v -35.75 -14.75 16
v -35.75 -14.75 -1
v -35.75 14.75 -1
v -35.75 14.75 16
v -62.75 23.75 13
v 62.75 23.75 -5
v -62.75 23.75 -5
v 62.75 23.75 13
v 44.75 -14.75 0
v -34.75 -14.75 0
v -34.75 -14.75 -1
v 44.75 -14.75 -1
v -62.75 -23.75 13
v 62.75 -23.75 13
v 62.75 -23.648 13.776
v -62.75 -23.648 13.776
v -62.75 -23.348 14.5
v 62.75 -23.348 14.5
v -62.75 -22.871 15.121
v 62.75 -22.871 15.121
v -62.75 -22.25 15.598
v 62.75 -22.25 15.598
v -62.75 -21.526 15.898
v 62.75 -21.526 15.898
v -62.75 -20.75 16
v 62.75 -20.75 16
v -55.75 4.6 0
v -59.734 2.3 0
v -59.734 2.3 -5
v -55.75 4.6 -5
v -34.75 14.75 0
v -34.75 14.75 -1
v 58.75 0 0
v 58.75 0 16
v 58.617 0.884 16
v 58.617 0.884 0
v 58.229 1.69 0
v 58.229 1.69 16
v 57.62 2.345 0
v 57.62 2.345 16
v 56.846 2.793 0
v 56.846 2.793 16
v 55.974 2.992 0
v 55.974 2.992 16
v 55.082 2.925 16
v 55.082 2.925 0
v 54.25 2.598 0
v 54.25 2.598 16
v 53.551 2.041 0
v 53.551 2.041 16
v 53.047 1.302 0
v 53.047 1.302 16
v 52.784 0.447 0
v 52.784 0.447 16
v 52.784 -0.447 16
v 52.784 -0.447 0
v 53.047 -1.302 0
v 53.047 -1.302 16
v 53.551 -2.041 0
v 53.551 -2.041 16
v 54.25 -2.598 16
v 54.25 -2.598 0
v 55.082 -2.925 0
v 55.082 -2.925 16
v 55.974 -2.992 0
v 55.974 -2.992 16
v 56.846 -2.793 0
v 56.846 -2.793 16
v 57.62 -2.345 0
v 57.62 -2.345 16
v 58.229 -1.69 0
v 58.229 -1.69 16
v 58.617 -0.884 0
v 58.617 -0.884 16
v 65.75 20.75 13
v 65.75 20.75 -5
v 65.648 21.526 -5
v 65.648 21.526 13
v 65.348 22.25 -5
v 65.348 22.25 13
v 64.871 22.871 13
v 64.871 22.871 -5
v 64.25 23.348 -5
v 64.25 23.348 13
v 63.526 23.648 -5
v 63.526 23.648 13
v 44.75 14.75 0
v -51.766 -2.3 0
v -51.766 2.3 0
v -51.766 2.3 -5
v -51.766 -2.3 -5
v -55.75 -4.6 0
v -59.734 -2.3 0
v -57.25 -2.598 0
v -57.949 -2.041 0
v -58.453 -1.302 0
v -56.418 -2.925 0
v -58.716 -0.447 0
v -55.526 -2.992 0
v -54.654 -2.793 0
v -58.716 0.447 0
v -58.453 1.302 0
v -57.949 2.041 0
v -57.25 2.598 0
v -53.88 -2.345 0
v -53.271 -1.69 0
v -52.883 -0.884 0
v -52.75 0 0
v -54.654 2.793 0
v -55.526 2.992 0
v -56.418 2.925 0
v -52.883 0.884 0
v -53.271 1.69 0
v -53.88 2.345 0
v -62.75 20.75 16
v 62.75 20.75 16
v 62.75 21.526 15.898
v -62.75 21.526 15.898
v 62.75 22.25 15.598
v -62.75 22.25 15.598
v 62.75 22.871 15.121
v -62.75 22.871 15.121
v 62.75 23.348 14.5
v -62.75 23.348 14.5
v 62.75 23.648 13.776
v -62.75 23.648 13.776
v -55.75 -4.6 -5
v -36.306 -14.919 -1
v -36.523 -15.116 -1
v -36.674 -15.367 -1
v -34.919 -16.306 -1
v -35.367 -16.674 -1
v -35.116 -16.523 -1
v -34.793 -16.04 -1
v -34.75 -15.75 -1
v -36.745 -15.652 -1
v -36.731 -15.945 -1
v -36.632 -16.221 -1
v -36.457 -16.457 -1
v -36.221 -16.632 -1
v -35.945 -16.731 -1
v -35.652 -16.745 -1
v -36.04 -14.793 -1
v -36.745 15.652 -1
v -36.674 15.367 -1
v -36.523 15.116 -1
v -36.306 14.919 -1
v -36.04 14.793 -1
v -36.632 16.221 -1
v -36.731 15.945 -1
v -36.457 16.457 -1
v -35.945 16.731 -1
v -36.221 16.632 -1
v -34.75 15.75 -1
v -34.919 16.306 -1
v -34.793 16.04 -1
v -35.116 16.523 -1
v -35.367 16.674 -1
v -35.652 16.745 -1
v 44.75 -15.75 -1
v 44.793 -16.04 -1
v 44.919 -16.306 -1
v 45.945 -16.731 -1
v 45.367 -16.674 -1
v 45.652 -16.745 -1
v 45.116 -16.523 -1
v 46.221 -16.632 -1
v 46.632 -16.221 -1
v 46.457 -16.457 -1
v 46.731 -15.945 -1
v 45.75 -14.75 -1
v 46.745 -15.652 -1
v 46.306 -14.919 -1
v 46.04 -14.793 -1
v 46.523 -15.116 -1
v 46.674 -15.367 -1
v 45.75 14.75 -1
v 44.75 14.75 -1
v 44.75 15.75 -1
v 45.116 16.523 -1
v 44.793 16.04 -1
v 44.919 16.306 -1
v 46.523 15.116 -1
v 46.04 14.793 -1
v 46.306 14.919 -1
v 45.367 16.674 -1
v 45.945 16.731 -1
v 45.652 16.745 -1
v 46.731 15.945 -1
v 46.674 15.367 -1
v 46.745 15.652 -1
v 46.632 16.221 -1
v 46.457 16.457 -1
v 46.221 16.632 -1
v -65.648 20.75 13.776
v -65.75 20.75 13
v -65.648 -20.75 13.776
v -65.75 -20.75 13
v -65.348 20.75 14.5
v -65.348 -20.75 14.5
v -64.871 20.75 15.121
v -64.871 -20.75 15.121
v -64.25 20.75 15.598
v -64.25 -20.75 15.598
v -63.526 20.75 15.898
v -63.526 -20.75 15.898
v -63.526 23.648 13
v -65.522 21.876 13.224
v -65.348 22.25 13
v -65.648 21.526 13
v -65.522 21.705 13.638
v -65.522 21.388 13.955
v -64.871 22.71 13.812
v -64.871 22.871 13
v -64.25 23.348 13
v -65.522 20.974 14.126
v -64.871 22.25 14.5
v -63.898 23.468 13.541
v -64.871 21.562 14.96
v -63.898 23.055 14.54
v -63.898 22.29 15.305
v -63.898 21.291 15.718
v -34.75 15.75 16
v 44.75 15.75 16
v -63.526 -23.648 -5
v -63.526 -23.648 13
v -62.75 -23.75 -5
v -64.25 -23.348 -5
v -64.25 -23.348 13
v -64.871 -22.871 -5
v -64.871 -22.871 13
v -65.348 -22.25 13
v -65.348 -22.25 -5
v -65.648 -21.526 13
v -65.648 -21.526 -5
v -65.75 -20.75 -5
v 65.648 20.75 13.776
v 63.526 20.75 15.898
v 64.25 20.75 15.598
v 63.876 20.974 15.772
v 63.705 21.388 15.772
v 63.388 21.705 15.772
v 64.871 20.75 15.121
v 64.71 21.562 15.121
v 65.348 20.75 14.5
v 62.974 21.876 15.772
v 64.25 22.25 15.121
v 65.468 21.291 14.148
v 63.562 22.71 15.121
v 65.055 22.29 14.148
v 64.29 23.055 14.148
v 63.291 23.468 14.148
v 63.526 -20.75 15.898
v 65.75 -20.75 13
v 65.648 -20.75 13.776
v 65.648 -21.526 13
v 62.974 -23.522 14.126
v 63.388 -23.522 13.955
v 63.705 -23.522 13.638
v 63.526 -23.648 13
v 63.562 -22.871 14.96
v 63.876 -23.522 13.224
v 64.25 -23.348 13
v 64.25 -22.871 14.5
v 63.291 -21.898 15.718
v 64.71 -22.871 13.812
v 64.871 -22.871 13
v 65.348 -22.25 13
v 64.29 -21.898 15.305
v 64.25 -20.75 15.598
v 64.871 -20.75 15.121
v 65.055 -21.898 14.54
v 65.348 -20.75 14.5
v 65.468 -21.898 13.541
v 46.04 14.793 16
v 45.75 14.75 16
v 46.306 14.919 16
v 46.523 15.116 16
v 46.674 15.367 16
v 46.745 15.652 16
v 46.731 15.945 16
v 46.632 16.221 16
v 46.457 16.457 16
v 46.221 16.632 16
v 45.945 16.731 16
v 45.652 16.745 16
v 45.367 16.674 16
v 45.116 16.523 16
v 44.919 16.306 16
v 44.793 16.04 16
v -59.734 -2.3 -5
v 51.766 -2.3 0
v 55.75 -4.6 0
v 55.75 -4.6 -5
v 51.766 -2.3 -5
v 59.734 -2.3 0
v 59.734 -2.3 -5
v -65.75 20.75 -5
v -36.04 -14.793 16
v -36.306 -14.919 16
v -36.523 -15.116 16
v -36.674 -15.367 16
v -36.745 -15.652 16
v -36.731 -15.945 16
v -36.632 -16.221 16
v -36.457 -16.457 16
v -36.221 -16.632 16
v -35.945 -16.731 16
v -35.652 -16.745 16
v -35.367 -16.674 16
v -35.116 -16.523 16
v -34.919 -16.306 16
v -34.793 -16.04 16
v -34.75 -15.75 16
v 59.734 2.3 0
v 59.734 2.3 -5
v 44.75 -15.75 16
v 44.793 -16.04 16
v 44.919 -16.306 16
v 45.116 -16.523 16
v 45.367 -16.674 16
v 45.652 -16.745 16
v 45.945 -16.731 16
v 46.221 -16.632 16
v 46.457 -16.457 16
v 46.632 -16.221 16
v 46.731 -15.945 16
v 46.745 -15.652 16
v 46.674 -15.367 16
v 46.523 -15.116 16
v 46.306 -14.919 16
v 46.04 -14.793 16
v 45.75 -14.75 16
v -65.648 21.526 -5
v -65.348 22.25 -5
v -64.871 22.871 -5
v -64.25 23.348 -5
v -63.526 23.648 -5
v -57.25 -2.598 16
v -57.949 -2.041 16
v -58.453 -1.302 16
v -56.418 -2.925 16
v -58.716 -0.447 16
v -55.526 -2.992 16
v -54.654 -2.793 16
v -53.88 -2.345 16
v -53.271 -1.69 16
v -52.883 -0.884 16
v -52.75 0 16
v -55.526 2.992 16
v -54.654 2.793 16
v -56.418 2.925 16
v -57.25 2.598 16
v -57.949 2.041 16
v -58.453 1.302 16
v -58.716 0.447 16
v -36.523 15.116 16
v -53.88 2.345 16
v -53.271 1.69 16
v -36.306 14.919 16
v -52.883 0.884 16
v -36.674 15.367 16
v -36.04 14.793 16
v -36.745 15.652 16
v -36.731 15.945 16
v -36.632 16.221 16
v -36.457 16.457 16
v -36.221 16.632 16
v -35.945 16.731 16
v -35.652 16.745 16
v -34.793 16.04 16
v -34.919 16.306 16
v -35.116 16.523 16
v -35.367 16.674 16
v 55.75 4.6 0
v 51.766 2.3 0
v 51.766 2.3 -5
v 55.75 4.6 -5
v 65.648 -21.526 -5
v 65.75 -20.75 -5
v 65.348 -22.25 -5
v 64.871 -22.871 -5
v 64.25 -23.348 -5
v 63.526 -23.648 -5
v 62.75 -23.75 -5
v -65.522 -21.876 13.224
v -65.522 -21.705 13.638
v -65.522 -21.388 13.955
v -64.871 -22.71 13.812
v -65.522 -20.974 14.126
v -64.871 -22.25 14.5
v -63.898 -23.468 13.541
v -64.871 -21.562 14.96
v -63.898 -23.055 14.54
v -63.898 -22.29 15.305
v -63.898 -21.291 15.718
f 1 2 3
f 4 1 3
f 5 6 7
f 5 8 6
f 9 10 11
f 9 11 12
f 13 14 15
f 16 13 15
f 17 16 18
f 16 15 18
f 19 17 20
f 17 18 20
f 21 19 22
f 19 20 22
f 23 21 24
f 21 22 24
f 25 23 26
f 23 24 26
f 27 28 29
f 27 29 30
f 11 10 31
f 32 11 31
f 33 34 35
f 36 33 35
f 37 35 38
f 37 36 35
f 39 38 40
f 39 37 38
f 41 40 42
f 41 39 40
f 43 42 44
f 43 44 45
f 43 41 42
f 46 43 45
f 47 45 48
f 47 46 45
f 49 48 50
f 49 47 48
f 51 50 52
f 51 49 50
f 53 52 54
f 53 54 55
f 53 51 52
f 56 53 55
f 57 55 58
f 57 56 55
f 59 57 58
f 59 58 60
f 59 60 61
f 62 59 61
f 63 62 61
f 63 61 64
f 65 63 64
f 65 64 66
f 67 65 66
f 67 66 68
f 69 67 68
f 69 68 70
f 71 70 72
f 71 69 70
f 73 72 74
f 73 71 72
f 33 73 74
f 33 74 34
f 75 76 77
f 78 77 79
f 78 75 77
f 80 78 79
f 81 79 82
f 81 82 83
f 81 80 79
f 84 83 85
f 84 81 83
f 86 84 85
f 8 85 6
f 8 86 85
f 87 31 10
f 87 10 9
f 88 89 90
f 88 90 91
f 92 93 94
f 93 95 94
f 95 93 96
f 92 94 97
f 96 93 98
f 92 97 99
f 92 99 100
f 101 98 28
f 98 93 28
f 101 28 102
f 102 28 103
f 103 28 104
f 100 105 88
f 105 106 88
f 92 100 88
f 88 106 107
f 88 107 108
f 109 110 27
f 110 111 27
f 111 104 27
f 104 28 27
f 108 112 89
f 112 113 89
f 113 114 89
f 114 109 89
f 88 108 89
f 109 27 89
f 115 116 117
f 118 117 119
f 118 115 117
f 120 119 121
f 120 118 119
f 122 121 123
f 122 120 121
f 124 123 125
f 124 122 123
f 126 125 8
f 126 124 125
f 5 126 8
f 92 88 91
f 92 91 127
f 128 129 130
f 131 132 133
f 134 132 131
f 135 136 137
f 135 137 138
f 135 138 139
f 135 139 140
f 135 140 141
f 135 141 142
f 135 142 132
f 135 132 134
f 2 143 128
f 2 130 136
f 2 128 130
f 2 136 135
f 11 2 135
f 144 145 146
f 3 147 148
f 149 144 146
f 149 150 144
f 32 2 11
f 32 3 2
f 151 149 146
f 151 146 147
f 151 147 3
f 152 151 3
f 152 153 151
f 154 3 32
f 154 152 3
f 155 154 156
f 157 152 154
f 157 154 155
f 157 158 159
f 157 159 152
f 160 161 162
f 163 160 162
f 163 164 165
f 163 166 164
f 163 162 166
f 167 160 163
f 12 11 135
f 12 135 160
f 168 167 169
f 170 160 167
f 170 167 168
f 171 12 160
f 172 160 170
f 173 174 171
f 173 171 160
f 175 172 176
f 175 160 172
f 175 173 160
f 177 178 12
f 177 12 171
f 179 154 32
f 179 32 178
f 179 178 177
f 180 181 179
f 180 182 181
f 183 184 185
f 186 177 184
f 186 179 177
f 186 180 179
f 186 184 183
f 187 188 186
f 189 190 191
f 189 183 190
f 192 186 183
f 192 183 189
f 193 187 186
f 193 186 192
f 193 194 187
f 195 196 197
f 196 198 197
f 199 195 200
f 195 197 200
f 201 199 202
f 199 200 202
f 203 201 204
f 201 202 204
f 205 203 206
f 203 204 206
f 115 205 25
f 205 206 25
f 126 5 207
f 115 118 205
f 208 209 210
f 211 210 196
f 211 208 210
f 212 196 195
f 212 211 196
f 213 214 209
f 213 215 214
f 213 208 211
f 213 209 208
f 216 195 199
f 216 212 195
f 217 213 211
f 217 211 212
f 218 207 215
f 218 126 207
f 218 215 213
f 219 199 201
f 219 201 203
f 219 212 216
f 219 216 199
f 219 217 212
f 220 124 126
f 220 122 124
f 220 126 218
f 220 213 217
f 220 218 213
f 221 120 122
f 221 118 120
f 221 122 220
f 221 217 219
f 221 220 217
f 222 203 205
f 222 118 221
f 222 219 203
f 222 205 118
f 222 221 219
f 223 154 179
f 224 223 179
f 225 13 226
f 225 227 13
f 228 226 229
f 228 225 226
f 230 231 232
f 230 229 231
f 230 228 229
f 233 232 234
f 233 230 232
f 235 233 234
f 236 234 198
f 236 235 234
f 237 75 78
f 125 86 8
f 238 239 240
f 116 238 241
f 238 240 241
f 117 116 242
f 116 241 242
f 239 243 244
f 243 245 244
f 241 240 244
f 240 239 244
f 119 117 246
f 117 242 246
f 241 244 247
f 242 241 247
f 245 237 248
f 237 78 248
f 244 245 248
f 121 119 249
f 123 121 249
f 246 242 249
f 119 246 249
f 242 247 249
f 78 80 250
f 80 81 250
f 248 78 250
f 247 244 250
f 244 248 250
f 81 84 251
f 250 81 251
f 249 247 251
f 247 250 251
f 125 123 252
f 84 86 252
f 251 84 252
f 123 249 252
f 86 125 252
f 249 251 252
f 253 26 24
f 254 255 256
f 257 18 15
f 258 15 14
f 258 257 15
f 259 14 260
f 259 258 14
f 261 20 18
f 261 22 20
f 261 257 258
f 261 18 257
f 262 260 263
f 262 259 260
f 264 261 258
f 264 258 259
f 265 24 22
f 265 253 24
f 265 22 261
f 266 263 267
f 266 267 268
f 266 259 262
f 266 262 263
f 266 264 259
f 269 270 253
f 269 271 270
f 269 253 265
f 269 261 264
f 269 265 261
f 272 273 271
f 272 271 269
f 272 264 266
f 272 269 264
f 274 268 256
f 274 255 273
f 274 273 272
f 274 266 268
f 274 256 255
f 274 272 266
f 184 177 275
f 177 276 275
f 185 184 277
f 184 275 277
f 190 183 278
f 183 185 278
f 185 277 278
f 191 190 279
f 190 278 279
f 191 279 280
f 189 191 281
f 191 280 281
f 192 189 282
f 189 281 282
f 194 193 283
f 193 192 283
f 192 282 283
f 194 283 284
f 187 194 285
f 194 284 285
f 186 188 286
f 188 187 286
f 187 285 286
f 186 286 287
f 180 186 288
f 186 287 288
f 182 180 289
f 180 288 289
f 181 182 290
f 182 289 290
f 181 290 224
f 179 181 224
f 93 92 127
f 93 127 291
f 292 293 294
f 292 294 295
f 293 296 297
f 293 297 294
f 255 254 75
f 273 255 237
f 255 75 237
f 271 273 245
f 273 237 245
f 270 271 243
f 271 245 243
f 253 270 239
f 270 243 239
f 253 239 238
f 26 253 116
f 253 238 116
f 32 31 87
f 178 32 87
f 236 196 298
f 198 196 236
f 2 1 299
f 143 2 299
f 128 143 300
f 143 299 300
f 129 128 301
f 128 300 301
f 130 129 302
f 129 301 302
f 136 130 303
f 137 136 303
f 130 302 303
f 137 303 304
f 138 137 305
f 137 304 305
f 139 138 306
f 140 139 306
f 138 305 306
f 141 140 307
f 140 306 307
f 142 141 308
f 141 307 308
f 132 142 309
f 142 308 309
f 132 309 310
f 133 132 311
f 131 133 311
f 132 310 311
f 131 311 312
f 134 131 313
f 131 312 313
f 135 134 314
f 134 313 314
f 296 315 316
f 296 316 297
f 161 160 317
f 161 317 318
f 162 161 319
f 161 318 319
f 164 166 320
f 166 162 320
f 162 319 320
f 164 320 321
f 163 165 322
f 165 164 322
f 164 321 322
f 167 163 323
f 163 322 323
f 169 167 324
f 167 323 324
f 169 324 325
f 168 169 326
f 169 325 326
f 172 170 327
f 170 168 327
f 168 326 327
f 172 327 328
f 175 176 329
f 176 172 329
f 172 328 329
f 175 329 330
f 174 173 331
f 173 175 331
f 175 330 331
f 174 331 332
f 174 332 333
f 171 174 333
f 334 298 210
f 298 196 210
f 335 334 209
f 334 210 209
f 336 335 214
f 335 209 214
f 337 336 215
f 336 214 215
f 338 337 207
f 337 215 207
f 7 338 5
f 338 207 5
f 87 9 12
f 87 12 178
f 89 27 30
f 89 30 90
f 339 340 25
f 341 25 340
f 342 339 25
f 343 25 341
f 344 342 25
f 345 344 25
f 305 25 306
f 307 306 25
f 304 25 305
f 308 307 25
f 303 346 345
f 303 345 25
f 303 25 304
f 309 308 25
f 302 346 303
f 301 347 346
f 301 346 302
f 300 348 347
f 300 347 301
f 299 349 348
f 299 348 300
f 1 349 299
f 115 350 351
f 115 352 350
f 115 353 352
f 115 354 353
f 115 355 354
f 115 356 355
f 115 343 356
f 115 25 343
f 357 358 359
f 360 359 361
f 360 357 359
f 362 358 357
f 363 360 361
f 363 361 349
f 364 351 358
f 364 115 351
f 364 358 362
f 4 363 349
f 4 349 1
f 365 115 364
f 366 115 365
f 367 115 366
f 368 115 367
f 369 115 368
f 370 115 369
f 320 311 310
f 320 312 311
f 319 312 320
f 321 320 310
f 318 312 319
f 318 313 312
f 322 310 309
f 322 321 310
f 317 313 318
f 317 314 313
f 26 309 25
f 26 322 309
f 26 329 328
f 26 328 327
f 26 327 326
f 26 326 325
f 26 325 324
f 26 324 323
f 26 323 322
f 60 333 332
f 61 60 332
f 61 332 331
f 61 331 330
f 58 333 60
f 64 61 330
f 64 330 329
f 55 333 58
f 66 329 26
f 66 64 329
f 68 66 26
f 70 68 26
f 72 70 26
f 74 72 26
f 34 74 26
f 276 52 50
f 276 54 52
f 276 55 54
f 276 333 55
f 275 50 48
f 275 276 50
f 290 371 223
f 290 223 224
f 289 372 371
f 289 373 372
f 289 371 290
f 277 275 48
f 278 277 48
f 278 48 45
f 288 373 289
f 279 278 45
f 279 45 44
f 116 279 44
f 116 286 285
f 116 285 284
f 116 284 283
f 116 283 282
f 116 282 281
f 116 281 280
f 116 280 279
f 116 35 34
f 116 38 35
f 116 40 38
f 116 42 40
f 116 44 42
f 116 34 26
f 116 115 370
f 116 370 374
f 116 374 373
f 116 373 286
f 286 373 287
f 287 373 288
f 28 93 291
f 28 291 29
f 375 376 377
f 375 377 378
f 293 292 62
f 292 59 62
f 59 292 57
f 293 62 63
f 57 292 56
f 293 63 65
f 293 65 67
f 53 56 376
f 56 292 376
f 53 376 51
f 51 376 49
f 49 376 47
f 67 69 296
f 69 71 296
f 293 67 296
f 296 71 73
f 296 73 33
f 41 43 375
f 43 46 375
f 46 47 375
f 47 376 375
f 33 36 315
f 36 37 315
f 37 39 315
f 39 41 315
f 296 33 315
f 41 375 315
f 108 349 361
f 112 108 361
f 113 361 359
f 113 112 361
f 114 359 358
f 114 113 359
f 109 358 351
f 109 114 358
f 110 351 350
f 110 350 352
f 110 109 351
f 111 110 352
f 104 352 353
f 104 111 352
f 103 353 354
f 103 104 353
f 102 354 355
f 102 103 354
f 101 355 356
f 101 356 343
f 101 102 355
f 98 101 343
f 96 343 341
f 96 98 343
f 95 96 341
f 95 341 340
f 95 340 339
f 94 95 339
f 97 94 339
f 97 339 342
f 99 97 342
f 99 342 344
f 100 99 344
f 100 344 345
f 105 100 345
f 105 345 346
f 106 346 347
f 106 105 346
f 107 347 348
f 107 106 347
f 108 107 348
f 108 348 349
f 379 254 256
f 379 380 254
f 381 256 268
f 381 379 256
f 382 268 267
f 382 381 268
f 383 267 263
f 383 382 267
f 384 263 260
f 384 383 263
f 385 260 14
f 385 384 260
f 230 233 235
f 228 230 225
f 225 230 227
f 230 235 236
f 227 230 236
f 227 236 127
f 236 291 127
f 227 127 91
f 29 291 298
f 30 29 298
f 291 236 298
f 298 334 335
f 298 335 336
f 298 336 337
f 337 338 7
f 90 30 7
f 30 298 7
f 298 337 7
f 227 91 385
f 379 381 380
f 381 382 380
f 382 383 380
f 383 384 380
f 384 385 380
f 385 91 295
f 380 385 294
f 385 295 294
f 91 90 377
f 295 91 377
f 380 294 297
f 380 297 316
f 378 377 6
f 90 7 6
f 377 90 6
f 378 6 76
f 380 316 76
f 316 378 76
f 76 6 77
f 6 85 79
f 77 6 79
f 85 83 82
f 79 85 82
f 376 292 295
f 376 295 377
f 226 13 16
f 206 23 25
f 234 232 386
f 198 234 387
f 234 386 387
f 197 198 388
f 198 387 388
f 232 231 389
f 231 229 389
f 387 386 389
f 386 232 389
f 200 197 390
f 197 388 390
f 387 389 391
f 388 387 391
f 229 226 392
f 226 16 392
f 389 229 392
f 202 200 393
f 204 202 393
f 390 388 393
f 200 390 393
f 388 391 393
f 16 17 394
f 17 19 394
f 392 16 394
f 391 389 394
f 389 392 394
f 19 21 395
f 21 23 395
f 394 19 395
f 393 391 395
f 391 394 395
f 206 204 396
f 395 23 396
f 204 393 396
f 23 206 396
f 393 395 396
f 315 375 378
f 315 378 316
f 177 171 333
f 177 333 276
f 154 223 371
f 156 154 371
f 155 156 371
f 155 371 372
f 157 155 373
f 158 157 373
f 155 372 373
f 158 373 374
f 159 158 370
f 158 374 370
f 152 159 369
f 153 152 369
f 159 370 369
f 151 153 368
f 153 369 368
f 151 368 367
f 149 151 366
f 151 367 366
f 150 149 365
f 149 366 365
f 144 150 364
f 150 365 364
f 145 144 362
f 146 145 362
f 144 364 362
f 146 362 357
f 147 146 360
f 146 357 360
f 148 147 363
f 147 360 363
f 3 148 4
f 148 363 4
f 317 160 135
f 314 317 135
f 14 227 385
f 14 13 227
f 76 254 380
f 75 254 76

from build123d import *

# Parameters (mm, degrees)
F0_W     = 20
F0_H     = 31.5
F0_R     = 3
F1_DEPTH = 16
F2_DEPTH = 5
F3_W     = 79.5
F3_H     = 29.5
F4_DEPTH = 1
F5_R     = 1
F6_DEPTH = 17
F7_R     = 3


# Not quite as in the source:
# - a feature names something its author has since deleted; it is built from what else it names


with BuildPart() as f1:
    # F0 (on Top) → F1 (new body)
    with BuildSketch(Plane.XY):
        Polygon((-35.75, -15.75), (-35.75, 15.75), (40.25, 15.75), (45.75, 15.75), (65.75, 15.75), (65.75, 23.75), (-65.75, 23.75), (-65.75, -23.75), (65.75, -23.75), (65.75, -15.75), (45.75, -15.75), (20.25, -15.75), align=None)
        Polygon((-51.7662831426, -2.3), (-55.75, -4.6), (-59.7337168574, -2.3), (-59.7337168574, 2.3), (-55.75, 4.6), (-51.7662831426, 2.3), align=None, mode=Mode.SUBTRACT)
        with Locations((55.75, 0)):
            Rectangle(F0_W, F0_H)
        Polygon((59.7337168574, -2.3), (55.75, -4.6), (51.7662831426, -2.3), (51.7662831426, 2.3), (55.75, 4.6), (59.7337168574, 2.3), align=None, mode=Mode.SUBTRACT)
        Polygon((-59.7337168574, -2.3), (-55.75, -4.6), (-51.7662831426, -2.3), (-51.7662831426, 2.3), (-55.75, 4.6), (-59.7337168574, 2.3), align=None)
        with Locations((-55.75, 0)):
            Circle(F0_R, mode=Mode.SUBTRACT)
        Polygon((51.7662831426, -2.3), (55.75, -4.6), (59.7337168574, -2.3), (59.7337168574, 2.3), (55.75, 4.6), (51.7662831426, 2.3), align=None)
        with Locations((55.75, 0)):
            Circle(F0_R, mode=Mode.SUBTRACT)
    extrude(amount=F1_DEPTH)

    # F0 (on Top) → F2 (join)
    with BuildSketch(Plane.XY):
        Polygon((-35.75, -15.75), (-35.75, 15.75), (40.25, 15.75), (45.75, 15.75), (65.75, 15.75), (65.75, 23.75), (-65.75, 23.75), (-65.75, -23.75), (65.75, -23.75), (65.75, -15.75), (45.75, -15.75), (20.25, -15.75), align=None)
        Polygon((-51.7662831426, -2.3), (-55.75, -4.6), (-59.7337168574, -2.3), (-59.7337168574, 2.3), (-55.75, 4.6), (-51.7662831426, 2.3), align=None, mode=Mode.SUBTRACT)
        with Locations((55.75, 0)):
            Rectangle(F0_W, F0_H)
        Polygon((59.7337168574, -2.3), (55.75, -4.6), (51.7662831426, -2.3), (51.7662831426, 2.3), (55.75, 4.6), (59.7337168574, 2.3), align=None, mode=Mode.SUBTRACT)
        Polygon((40.25, 15.75), (-35.75, 15.75), (-35.75, -15.75), (20.25, -15.75), (45.75, -15.75), (45.75, 15.75), align=None)
    extrude(amount=-F2_DEPTH)

    # F3 (on face) → F4 (cut)
    with BuildSketch(Plane.XY):
        Polygon((45.75, 15.75), (40.25, 15.75), (-35.75, 15.75), (-35.75, -15.75), (20.25, -15.75), (45.75, -15.75), align=None)
        with Locations((5, 0)):
            Rectangle(F3_W, F3_H, mode=Mode.SUBTRACT)
    extrude(amount=-F4_DEPTH, mode=Mode.SUBTRACT)

    # F5 (on face) → F6 (cut, through all)
    with BuildSketch(Plane.XY.offset(16)):
        with Locations((45.75, 15.75)):
            Circle(F5_R)
        with Locations((45.75, -15.75)):
            Circle(F5_R)
        with Locations((-35.75, -15.75)):
            Circle(F5_R)
        with Locations((-35.75, 15.75)):
            Circle(F5_R)
    extrude(amount=-F6_DEPTH, mode=Mode.SUBTRACT)

    # F7
    f7_edges = [f1.edges().sort_by_distance(p)[0] for p in [
        (65.75, 23.75, 5.5),
        (65.75, 0, 16),
        (0, 23.75, 16),
        (0, -23.75, 16),
        (65.75, -23.75, 5.5),
        (-65.75, -23.75, 5.5),
        (-65.75, 23.75, 5.5),
        (-65.75, 0, 16),
    ]]
    fillet(f7_edges, radius=F7_R)


solid = f1.part
